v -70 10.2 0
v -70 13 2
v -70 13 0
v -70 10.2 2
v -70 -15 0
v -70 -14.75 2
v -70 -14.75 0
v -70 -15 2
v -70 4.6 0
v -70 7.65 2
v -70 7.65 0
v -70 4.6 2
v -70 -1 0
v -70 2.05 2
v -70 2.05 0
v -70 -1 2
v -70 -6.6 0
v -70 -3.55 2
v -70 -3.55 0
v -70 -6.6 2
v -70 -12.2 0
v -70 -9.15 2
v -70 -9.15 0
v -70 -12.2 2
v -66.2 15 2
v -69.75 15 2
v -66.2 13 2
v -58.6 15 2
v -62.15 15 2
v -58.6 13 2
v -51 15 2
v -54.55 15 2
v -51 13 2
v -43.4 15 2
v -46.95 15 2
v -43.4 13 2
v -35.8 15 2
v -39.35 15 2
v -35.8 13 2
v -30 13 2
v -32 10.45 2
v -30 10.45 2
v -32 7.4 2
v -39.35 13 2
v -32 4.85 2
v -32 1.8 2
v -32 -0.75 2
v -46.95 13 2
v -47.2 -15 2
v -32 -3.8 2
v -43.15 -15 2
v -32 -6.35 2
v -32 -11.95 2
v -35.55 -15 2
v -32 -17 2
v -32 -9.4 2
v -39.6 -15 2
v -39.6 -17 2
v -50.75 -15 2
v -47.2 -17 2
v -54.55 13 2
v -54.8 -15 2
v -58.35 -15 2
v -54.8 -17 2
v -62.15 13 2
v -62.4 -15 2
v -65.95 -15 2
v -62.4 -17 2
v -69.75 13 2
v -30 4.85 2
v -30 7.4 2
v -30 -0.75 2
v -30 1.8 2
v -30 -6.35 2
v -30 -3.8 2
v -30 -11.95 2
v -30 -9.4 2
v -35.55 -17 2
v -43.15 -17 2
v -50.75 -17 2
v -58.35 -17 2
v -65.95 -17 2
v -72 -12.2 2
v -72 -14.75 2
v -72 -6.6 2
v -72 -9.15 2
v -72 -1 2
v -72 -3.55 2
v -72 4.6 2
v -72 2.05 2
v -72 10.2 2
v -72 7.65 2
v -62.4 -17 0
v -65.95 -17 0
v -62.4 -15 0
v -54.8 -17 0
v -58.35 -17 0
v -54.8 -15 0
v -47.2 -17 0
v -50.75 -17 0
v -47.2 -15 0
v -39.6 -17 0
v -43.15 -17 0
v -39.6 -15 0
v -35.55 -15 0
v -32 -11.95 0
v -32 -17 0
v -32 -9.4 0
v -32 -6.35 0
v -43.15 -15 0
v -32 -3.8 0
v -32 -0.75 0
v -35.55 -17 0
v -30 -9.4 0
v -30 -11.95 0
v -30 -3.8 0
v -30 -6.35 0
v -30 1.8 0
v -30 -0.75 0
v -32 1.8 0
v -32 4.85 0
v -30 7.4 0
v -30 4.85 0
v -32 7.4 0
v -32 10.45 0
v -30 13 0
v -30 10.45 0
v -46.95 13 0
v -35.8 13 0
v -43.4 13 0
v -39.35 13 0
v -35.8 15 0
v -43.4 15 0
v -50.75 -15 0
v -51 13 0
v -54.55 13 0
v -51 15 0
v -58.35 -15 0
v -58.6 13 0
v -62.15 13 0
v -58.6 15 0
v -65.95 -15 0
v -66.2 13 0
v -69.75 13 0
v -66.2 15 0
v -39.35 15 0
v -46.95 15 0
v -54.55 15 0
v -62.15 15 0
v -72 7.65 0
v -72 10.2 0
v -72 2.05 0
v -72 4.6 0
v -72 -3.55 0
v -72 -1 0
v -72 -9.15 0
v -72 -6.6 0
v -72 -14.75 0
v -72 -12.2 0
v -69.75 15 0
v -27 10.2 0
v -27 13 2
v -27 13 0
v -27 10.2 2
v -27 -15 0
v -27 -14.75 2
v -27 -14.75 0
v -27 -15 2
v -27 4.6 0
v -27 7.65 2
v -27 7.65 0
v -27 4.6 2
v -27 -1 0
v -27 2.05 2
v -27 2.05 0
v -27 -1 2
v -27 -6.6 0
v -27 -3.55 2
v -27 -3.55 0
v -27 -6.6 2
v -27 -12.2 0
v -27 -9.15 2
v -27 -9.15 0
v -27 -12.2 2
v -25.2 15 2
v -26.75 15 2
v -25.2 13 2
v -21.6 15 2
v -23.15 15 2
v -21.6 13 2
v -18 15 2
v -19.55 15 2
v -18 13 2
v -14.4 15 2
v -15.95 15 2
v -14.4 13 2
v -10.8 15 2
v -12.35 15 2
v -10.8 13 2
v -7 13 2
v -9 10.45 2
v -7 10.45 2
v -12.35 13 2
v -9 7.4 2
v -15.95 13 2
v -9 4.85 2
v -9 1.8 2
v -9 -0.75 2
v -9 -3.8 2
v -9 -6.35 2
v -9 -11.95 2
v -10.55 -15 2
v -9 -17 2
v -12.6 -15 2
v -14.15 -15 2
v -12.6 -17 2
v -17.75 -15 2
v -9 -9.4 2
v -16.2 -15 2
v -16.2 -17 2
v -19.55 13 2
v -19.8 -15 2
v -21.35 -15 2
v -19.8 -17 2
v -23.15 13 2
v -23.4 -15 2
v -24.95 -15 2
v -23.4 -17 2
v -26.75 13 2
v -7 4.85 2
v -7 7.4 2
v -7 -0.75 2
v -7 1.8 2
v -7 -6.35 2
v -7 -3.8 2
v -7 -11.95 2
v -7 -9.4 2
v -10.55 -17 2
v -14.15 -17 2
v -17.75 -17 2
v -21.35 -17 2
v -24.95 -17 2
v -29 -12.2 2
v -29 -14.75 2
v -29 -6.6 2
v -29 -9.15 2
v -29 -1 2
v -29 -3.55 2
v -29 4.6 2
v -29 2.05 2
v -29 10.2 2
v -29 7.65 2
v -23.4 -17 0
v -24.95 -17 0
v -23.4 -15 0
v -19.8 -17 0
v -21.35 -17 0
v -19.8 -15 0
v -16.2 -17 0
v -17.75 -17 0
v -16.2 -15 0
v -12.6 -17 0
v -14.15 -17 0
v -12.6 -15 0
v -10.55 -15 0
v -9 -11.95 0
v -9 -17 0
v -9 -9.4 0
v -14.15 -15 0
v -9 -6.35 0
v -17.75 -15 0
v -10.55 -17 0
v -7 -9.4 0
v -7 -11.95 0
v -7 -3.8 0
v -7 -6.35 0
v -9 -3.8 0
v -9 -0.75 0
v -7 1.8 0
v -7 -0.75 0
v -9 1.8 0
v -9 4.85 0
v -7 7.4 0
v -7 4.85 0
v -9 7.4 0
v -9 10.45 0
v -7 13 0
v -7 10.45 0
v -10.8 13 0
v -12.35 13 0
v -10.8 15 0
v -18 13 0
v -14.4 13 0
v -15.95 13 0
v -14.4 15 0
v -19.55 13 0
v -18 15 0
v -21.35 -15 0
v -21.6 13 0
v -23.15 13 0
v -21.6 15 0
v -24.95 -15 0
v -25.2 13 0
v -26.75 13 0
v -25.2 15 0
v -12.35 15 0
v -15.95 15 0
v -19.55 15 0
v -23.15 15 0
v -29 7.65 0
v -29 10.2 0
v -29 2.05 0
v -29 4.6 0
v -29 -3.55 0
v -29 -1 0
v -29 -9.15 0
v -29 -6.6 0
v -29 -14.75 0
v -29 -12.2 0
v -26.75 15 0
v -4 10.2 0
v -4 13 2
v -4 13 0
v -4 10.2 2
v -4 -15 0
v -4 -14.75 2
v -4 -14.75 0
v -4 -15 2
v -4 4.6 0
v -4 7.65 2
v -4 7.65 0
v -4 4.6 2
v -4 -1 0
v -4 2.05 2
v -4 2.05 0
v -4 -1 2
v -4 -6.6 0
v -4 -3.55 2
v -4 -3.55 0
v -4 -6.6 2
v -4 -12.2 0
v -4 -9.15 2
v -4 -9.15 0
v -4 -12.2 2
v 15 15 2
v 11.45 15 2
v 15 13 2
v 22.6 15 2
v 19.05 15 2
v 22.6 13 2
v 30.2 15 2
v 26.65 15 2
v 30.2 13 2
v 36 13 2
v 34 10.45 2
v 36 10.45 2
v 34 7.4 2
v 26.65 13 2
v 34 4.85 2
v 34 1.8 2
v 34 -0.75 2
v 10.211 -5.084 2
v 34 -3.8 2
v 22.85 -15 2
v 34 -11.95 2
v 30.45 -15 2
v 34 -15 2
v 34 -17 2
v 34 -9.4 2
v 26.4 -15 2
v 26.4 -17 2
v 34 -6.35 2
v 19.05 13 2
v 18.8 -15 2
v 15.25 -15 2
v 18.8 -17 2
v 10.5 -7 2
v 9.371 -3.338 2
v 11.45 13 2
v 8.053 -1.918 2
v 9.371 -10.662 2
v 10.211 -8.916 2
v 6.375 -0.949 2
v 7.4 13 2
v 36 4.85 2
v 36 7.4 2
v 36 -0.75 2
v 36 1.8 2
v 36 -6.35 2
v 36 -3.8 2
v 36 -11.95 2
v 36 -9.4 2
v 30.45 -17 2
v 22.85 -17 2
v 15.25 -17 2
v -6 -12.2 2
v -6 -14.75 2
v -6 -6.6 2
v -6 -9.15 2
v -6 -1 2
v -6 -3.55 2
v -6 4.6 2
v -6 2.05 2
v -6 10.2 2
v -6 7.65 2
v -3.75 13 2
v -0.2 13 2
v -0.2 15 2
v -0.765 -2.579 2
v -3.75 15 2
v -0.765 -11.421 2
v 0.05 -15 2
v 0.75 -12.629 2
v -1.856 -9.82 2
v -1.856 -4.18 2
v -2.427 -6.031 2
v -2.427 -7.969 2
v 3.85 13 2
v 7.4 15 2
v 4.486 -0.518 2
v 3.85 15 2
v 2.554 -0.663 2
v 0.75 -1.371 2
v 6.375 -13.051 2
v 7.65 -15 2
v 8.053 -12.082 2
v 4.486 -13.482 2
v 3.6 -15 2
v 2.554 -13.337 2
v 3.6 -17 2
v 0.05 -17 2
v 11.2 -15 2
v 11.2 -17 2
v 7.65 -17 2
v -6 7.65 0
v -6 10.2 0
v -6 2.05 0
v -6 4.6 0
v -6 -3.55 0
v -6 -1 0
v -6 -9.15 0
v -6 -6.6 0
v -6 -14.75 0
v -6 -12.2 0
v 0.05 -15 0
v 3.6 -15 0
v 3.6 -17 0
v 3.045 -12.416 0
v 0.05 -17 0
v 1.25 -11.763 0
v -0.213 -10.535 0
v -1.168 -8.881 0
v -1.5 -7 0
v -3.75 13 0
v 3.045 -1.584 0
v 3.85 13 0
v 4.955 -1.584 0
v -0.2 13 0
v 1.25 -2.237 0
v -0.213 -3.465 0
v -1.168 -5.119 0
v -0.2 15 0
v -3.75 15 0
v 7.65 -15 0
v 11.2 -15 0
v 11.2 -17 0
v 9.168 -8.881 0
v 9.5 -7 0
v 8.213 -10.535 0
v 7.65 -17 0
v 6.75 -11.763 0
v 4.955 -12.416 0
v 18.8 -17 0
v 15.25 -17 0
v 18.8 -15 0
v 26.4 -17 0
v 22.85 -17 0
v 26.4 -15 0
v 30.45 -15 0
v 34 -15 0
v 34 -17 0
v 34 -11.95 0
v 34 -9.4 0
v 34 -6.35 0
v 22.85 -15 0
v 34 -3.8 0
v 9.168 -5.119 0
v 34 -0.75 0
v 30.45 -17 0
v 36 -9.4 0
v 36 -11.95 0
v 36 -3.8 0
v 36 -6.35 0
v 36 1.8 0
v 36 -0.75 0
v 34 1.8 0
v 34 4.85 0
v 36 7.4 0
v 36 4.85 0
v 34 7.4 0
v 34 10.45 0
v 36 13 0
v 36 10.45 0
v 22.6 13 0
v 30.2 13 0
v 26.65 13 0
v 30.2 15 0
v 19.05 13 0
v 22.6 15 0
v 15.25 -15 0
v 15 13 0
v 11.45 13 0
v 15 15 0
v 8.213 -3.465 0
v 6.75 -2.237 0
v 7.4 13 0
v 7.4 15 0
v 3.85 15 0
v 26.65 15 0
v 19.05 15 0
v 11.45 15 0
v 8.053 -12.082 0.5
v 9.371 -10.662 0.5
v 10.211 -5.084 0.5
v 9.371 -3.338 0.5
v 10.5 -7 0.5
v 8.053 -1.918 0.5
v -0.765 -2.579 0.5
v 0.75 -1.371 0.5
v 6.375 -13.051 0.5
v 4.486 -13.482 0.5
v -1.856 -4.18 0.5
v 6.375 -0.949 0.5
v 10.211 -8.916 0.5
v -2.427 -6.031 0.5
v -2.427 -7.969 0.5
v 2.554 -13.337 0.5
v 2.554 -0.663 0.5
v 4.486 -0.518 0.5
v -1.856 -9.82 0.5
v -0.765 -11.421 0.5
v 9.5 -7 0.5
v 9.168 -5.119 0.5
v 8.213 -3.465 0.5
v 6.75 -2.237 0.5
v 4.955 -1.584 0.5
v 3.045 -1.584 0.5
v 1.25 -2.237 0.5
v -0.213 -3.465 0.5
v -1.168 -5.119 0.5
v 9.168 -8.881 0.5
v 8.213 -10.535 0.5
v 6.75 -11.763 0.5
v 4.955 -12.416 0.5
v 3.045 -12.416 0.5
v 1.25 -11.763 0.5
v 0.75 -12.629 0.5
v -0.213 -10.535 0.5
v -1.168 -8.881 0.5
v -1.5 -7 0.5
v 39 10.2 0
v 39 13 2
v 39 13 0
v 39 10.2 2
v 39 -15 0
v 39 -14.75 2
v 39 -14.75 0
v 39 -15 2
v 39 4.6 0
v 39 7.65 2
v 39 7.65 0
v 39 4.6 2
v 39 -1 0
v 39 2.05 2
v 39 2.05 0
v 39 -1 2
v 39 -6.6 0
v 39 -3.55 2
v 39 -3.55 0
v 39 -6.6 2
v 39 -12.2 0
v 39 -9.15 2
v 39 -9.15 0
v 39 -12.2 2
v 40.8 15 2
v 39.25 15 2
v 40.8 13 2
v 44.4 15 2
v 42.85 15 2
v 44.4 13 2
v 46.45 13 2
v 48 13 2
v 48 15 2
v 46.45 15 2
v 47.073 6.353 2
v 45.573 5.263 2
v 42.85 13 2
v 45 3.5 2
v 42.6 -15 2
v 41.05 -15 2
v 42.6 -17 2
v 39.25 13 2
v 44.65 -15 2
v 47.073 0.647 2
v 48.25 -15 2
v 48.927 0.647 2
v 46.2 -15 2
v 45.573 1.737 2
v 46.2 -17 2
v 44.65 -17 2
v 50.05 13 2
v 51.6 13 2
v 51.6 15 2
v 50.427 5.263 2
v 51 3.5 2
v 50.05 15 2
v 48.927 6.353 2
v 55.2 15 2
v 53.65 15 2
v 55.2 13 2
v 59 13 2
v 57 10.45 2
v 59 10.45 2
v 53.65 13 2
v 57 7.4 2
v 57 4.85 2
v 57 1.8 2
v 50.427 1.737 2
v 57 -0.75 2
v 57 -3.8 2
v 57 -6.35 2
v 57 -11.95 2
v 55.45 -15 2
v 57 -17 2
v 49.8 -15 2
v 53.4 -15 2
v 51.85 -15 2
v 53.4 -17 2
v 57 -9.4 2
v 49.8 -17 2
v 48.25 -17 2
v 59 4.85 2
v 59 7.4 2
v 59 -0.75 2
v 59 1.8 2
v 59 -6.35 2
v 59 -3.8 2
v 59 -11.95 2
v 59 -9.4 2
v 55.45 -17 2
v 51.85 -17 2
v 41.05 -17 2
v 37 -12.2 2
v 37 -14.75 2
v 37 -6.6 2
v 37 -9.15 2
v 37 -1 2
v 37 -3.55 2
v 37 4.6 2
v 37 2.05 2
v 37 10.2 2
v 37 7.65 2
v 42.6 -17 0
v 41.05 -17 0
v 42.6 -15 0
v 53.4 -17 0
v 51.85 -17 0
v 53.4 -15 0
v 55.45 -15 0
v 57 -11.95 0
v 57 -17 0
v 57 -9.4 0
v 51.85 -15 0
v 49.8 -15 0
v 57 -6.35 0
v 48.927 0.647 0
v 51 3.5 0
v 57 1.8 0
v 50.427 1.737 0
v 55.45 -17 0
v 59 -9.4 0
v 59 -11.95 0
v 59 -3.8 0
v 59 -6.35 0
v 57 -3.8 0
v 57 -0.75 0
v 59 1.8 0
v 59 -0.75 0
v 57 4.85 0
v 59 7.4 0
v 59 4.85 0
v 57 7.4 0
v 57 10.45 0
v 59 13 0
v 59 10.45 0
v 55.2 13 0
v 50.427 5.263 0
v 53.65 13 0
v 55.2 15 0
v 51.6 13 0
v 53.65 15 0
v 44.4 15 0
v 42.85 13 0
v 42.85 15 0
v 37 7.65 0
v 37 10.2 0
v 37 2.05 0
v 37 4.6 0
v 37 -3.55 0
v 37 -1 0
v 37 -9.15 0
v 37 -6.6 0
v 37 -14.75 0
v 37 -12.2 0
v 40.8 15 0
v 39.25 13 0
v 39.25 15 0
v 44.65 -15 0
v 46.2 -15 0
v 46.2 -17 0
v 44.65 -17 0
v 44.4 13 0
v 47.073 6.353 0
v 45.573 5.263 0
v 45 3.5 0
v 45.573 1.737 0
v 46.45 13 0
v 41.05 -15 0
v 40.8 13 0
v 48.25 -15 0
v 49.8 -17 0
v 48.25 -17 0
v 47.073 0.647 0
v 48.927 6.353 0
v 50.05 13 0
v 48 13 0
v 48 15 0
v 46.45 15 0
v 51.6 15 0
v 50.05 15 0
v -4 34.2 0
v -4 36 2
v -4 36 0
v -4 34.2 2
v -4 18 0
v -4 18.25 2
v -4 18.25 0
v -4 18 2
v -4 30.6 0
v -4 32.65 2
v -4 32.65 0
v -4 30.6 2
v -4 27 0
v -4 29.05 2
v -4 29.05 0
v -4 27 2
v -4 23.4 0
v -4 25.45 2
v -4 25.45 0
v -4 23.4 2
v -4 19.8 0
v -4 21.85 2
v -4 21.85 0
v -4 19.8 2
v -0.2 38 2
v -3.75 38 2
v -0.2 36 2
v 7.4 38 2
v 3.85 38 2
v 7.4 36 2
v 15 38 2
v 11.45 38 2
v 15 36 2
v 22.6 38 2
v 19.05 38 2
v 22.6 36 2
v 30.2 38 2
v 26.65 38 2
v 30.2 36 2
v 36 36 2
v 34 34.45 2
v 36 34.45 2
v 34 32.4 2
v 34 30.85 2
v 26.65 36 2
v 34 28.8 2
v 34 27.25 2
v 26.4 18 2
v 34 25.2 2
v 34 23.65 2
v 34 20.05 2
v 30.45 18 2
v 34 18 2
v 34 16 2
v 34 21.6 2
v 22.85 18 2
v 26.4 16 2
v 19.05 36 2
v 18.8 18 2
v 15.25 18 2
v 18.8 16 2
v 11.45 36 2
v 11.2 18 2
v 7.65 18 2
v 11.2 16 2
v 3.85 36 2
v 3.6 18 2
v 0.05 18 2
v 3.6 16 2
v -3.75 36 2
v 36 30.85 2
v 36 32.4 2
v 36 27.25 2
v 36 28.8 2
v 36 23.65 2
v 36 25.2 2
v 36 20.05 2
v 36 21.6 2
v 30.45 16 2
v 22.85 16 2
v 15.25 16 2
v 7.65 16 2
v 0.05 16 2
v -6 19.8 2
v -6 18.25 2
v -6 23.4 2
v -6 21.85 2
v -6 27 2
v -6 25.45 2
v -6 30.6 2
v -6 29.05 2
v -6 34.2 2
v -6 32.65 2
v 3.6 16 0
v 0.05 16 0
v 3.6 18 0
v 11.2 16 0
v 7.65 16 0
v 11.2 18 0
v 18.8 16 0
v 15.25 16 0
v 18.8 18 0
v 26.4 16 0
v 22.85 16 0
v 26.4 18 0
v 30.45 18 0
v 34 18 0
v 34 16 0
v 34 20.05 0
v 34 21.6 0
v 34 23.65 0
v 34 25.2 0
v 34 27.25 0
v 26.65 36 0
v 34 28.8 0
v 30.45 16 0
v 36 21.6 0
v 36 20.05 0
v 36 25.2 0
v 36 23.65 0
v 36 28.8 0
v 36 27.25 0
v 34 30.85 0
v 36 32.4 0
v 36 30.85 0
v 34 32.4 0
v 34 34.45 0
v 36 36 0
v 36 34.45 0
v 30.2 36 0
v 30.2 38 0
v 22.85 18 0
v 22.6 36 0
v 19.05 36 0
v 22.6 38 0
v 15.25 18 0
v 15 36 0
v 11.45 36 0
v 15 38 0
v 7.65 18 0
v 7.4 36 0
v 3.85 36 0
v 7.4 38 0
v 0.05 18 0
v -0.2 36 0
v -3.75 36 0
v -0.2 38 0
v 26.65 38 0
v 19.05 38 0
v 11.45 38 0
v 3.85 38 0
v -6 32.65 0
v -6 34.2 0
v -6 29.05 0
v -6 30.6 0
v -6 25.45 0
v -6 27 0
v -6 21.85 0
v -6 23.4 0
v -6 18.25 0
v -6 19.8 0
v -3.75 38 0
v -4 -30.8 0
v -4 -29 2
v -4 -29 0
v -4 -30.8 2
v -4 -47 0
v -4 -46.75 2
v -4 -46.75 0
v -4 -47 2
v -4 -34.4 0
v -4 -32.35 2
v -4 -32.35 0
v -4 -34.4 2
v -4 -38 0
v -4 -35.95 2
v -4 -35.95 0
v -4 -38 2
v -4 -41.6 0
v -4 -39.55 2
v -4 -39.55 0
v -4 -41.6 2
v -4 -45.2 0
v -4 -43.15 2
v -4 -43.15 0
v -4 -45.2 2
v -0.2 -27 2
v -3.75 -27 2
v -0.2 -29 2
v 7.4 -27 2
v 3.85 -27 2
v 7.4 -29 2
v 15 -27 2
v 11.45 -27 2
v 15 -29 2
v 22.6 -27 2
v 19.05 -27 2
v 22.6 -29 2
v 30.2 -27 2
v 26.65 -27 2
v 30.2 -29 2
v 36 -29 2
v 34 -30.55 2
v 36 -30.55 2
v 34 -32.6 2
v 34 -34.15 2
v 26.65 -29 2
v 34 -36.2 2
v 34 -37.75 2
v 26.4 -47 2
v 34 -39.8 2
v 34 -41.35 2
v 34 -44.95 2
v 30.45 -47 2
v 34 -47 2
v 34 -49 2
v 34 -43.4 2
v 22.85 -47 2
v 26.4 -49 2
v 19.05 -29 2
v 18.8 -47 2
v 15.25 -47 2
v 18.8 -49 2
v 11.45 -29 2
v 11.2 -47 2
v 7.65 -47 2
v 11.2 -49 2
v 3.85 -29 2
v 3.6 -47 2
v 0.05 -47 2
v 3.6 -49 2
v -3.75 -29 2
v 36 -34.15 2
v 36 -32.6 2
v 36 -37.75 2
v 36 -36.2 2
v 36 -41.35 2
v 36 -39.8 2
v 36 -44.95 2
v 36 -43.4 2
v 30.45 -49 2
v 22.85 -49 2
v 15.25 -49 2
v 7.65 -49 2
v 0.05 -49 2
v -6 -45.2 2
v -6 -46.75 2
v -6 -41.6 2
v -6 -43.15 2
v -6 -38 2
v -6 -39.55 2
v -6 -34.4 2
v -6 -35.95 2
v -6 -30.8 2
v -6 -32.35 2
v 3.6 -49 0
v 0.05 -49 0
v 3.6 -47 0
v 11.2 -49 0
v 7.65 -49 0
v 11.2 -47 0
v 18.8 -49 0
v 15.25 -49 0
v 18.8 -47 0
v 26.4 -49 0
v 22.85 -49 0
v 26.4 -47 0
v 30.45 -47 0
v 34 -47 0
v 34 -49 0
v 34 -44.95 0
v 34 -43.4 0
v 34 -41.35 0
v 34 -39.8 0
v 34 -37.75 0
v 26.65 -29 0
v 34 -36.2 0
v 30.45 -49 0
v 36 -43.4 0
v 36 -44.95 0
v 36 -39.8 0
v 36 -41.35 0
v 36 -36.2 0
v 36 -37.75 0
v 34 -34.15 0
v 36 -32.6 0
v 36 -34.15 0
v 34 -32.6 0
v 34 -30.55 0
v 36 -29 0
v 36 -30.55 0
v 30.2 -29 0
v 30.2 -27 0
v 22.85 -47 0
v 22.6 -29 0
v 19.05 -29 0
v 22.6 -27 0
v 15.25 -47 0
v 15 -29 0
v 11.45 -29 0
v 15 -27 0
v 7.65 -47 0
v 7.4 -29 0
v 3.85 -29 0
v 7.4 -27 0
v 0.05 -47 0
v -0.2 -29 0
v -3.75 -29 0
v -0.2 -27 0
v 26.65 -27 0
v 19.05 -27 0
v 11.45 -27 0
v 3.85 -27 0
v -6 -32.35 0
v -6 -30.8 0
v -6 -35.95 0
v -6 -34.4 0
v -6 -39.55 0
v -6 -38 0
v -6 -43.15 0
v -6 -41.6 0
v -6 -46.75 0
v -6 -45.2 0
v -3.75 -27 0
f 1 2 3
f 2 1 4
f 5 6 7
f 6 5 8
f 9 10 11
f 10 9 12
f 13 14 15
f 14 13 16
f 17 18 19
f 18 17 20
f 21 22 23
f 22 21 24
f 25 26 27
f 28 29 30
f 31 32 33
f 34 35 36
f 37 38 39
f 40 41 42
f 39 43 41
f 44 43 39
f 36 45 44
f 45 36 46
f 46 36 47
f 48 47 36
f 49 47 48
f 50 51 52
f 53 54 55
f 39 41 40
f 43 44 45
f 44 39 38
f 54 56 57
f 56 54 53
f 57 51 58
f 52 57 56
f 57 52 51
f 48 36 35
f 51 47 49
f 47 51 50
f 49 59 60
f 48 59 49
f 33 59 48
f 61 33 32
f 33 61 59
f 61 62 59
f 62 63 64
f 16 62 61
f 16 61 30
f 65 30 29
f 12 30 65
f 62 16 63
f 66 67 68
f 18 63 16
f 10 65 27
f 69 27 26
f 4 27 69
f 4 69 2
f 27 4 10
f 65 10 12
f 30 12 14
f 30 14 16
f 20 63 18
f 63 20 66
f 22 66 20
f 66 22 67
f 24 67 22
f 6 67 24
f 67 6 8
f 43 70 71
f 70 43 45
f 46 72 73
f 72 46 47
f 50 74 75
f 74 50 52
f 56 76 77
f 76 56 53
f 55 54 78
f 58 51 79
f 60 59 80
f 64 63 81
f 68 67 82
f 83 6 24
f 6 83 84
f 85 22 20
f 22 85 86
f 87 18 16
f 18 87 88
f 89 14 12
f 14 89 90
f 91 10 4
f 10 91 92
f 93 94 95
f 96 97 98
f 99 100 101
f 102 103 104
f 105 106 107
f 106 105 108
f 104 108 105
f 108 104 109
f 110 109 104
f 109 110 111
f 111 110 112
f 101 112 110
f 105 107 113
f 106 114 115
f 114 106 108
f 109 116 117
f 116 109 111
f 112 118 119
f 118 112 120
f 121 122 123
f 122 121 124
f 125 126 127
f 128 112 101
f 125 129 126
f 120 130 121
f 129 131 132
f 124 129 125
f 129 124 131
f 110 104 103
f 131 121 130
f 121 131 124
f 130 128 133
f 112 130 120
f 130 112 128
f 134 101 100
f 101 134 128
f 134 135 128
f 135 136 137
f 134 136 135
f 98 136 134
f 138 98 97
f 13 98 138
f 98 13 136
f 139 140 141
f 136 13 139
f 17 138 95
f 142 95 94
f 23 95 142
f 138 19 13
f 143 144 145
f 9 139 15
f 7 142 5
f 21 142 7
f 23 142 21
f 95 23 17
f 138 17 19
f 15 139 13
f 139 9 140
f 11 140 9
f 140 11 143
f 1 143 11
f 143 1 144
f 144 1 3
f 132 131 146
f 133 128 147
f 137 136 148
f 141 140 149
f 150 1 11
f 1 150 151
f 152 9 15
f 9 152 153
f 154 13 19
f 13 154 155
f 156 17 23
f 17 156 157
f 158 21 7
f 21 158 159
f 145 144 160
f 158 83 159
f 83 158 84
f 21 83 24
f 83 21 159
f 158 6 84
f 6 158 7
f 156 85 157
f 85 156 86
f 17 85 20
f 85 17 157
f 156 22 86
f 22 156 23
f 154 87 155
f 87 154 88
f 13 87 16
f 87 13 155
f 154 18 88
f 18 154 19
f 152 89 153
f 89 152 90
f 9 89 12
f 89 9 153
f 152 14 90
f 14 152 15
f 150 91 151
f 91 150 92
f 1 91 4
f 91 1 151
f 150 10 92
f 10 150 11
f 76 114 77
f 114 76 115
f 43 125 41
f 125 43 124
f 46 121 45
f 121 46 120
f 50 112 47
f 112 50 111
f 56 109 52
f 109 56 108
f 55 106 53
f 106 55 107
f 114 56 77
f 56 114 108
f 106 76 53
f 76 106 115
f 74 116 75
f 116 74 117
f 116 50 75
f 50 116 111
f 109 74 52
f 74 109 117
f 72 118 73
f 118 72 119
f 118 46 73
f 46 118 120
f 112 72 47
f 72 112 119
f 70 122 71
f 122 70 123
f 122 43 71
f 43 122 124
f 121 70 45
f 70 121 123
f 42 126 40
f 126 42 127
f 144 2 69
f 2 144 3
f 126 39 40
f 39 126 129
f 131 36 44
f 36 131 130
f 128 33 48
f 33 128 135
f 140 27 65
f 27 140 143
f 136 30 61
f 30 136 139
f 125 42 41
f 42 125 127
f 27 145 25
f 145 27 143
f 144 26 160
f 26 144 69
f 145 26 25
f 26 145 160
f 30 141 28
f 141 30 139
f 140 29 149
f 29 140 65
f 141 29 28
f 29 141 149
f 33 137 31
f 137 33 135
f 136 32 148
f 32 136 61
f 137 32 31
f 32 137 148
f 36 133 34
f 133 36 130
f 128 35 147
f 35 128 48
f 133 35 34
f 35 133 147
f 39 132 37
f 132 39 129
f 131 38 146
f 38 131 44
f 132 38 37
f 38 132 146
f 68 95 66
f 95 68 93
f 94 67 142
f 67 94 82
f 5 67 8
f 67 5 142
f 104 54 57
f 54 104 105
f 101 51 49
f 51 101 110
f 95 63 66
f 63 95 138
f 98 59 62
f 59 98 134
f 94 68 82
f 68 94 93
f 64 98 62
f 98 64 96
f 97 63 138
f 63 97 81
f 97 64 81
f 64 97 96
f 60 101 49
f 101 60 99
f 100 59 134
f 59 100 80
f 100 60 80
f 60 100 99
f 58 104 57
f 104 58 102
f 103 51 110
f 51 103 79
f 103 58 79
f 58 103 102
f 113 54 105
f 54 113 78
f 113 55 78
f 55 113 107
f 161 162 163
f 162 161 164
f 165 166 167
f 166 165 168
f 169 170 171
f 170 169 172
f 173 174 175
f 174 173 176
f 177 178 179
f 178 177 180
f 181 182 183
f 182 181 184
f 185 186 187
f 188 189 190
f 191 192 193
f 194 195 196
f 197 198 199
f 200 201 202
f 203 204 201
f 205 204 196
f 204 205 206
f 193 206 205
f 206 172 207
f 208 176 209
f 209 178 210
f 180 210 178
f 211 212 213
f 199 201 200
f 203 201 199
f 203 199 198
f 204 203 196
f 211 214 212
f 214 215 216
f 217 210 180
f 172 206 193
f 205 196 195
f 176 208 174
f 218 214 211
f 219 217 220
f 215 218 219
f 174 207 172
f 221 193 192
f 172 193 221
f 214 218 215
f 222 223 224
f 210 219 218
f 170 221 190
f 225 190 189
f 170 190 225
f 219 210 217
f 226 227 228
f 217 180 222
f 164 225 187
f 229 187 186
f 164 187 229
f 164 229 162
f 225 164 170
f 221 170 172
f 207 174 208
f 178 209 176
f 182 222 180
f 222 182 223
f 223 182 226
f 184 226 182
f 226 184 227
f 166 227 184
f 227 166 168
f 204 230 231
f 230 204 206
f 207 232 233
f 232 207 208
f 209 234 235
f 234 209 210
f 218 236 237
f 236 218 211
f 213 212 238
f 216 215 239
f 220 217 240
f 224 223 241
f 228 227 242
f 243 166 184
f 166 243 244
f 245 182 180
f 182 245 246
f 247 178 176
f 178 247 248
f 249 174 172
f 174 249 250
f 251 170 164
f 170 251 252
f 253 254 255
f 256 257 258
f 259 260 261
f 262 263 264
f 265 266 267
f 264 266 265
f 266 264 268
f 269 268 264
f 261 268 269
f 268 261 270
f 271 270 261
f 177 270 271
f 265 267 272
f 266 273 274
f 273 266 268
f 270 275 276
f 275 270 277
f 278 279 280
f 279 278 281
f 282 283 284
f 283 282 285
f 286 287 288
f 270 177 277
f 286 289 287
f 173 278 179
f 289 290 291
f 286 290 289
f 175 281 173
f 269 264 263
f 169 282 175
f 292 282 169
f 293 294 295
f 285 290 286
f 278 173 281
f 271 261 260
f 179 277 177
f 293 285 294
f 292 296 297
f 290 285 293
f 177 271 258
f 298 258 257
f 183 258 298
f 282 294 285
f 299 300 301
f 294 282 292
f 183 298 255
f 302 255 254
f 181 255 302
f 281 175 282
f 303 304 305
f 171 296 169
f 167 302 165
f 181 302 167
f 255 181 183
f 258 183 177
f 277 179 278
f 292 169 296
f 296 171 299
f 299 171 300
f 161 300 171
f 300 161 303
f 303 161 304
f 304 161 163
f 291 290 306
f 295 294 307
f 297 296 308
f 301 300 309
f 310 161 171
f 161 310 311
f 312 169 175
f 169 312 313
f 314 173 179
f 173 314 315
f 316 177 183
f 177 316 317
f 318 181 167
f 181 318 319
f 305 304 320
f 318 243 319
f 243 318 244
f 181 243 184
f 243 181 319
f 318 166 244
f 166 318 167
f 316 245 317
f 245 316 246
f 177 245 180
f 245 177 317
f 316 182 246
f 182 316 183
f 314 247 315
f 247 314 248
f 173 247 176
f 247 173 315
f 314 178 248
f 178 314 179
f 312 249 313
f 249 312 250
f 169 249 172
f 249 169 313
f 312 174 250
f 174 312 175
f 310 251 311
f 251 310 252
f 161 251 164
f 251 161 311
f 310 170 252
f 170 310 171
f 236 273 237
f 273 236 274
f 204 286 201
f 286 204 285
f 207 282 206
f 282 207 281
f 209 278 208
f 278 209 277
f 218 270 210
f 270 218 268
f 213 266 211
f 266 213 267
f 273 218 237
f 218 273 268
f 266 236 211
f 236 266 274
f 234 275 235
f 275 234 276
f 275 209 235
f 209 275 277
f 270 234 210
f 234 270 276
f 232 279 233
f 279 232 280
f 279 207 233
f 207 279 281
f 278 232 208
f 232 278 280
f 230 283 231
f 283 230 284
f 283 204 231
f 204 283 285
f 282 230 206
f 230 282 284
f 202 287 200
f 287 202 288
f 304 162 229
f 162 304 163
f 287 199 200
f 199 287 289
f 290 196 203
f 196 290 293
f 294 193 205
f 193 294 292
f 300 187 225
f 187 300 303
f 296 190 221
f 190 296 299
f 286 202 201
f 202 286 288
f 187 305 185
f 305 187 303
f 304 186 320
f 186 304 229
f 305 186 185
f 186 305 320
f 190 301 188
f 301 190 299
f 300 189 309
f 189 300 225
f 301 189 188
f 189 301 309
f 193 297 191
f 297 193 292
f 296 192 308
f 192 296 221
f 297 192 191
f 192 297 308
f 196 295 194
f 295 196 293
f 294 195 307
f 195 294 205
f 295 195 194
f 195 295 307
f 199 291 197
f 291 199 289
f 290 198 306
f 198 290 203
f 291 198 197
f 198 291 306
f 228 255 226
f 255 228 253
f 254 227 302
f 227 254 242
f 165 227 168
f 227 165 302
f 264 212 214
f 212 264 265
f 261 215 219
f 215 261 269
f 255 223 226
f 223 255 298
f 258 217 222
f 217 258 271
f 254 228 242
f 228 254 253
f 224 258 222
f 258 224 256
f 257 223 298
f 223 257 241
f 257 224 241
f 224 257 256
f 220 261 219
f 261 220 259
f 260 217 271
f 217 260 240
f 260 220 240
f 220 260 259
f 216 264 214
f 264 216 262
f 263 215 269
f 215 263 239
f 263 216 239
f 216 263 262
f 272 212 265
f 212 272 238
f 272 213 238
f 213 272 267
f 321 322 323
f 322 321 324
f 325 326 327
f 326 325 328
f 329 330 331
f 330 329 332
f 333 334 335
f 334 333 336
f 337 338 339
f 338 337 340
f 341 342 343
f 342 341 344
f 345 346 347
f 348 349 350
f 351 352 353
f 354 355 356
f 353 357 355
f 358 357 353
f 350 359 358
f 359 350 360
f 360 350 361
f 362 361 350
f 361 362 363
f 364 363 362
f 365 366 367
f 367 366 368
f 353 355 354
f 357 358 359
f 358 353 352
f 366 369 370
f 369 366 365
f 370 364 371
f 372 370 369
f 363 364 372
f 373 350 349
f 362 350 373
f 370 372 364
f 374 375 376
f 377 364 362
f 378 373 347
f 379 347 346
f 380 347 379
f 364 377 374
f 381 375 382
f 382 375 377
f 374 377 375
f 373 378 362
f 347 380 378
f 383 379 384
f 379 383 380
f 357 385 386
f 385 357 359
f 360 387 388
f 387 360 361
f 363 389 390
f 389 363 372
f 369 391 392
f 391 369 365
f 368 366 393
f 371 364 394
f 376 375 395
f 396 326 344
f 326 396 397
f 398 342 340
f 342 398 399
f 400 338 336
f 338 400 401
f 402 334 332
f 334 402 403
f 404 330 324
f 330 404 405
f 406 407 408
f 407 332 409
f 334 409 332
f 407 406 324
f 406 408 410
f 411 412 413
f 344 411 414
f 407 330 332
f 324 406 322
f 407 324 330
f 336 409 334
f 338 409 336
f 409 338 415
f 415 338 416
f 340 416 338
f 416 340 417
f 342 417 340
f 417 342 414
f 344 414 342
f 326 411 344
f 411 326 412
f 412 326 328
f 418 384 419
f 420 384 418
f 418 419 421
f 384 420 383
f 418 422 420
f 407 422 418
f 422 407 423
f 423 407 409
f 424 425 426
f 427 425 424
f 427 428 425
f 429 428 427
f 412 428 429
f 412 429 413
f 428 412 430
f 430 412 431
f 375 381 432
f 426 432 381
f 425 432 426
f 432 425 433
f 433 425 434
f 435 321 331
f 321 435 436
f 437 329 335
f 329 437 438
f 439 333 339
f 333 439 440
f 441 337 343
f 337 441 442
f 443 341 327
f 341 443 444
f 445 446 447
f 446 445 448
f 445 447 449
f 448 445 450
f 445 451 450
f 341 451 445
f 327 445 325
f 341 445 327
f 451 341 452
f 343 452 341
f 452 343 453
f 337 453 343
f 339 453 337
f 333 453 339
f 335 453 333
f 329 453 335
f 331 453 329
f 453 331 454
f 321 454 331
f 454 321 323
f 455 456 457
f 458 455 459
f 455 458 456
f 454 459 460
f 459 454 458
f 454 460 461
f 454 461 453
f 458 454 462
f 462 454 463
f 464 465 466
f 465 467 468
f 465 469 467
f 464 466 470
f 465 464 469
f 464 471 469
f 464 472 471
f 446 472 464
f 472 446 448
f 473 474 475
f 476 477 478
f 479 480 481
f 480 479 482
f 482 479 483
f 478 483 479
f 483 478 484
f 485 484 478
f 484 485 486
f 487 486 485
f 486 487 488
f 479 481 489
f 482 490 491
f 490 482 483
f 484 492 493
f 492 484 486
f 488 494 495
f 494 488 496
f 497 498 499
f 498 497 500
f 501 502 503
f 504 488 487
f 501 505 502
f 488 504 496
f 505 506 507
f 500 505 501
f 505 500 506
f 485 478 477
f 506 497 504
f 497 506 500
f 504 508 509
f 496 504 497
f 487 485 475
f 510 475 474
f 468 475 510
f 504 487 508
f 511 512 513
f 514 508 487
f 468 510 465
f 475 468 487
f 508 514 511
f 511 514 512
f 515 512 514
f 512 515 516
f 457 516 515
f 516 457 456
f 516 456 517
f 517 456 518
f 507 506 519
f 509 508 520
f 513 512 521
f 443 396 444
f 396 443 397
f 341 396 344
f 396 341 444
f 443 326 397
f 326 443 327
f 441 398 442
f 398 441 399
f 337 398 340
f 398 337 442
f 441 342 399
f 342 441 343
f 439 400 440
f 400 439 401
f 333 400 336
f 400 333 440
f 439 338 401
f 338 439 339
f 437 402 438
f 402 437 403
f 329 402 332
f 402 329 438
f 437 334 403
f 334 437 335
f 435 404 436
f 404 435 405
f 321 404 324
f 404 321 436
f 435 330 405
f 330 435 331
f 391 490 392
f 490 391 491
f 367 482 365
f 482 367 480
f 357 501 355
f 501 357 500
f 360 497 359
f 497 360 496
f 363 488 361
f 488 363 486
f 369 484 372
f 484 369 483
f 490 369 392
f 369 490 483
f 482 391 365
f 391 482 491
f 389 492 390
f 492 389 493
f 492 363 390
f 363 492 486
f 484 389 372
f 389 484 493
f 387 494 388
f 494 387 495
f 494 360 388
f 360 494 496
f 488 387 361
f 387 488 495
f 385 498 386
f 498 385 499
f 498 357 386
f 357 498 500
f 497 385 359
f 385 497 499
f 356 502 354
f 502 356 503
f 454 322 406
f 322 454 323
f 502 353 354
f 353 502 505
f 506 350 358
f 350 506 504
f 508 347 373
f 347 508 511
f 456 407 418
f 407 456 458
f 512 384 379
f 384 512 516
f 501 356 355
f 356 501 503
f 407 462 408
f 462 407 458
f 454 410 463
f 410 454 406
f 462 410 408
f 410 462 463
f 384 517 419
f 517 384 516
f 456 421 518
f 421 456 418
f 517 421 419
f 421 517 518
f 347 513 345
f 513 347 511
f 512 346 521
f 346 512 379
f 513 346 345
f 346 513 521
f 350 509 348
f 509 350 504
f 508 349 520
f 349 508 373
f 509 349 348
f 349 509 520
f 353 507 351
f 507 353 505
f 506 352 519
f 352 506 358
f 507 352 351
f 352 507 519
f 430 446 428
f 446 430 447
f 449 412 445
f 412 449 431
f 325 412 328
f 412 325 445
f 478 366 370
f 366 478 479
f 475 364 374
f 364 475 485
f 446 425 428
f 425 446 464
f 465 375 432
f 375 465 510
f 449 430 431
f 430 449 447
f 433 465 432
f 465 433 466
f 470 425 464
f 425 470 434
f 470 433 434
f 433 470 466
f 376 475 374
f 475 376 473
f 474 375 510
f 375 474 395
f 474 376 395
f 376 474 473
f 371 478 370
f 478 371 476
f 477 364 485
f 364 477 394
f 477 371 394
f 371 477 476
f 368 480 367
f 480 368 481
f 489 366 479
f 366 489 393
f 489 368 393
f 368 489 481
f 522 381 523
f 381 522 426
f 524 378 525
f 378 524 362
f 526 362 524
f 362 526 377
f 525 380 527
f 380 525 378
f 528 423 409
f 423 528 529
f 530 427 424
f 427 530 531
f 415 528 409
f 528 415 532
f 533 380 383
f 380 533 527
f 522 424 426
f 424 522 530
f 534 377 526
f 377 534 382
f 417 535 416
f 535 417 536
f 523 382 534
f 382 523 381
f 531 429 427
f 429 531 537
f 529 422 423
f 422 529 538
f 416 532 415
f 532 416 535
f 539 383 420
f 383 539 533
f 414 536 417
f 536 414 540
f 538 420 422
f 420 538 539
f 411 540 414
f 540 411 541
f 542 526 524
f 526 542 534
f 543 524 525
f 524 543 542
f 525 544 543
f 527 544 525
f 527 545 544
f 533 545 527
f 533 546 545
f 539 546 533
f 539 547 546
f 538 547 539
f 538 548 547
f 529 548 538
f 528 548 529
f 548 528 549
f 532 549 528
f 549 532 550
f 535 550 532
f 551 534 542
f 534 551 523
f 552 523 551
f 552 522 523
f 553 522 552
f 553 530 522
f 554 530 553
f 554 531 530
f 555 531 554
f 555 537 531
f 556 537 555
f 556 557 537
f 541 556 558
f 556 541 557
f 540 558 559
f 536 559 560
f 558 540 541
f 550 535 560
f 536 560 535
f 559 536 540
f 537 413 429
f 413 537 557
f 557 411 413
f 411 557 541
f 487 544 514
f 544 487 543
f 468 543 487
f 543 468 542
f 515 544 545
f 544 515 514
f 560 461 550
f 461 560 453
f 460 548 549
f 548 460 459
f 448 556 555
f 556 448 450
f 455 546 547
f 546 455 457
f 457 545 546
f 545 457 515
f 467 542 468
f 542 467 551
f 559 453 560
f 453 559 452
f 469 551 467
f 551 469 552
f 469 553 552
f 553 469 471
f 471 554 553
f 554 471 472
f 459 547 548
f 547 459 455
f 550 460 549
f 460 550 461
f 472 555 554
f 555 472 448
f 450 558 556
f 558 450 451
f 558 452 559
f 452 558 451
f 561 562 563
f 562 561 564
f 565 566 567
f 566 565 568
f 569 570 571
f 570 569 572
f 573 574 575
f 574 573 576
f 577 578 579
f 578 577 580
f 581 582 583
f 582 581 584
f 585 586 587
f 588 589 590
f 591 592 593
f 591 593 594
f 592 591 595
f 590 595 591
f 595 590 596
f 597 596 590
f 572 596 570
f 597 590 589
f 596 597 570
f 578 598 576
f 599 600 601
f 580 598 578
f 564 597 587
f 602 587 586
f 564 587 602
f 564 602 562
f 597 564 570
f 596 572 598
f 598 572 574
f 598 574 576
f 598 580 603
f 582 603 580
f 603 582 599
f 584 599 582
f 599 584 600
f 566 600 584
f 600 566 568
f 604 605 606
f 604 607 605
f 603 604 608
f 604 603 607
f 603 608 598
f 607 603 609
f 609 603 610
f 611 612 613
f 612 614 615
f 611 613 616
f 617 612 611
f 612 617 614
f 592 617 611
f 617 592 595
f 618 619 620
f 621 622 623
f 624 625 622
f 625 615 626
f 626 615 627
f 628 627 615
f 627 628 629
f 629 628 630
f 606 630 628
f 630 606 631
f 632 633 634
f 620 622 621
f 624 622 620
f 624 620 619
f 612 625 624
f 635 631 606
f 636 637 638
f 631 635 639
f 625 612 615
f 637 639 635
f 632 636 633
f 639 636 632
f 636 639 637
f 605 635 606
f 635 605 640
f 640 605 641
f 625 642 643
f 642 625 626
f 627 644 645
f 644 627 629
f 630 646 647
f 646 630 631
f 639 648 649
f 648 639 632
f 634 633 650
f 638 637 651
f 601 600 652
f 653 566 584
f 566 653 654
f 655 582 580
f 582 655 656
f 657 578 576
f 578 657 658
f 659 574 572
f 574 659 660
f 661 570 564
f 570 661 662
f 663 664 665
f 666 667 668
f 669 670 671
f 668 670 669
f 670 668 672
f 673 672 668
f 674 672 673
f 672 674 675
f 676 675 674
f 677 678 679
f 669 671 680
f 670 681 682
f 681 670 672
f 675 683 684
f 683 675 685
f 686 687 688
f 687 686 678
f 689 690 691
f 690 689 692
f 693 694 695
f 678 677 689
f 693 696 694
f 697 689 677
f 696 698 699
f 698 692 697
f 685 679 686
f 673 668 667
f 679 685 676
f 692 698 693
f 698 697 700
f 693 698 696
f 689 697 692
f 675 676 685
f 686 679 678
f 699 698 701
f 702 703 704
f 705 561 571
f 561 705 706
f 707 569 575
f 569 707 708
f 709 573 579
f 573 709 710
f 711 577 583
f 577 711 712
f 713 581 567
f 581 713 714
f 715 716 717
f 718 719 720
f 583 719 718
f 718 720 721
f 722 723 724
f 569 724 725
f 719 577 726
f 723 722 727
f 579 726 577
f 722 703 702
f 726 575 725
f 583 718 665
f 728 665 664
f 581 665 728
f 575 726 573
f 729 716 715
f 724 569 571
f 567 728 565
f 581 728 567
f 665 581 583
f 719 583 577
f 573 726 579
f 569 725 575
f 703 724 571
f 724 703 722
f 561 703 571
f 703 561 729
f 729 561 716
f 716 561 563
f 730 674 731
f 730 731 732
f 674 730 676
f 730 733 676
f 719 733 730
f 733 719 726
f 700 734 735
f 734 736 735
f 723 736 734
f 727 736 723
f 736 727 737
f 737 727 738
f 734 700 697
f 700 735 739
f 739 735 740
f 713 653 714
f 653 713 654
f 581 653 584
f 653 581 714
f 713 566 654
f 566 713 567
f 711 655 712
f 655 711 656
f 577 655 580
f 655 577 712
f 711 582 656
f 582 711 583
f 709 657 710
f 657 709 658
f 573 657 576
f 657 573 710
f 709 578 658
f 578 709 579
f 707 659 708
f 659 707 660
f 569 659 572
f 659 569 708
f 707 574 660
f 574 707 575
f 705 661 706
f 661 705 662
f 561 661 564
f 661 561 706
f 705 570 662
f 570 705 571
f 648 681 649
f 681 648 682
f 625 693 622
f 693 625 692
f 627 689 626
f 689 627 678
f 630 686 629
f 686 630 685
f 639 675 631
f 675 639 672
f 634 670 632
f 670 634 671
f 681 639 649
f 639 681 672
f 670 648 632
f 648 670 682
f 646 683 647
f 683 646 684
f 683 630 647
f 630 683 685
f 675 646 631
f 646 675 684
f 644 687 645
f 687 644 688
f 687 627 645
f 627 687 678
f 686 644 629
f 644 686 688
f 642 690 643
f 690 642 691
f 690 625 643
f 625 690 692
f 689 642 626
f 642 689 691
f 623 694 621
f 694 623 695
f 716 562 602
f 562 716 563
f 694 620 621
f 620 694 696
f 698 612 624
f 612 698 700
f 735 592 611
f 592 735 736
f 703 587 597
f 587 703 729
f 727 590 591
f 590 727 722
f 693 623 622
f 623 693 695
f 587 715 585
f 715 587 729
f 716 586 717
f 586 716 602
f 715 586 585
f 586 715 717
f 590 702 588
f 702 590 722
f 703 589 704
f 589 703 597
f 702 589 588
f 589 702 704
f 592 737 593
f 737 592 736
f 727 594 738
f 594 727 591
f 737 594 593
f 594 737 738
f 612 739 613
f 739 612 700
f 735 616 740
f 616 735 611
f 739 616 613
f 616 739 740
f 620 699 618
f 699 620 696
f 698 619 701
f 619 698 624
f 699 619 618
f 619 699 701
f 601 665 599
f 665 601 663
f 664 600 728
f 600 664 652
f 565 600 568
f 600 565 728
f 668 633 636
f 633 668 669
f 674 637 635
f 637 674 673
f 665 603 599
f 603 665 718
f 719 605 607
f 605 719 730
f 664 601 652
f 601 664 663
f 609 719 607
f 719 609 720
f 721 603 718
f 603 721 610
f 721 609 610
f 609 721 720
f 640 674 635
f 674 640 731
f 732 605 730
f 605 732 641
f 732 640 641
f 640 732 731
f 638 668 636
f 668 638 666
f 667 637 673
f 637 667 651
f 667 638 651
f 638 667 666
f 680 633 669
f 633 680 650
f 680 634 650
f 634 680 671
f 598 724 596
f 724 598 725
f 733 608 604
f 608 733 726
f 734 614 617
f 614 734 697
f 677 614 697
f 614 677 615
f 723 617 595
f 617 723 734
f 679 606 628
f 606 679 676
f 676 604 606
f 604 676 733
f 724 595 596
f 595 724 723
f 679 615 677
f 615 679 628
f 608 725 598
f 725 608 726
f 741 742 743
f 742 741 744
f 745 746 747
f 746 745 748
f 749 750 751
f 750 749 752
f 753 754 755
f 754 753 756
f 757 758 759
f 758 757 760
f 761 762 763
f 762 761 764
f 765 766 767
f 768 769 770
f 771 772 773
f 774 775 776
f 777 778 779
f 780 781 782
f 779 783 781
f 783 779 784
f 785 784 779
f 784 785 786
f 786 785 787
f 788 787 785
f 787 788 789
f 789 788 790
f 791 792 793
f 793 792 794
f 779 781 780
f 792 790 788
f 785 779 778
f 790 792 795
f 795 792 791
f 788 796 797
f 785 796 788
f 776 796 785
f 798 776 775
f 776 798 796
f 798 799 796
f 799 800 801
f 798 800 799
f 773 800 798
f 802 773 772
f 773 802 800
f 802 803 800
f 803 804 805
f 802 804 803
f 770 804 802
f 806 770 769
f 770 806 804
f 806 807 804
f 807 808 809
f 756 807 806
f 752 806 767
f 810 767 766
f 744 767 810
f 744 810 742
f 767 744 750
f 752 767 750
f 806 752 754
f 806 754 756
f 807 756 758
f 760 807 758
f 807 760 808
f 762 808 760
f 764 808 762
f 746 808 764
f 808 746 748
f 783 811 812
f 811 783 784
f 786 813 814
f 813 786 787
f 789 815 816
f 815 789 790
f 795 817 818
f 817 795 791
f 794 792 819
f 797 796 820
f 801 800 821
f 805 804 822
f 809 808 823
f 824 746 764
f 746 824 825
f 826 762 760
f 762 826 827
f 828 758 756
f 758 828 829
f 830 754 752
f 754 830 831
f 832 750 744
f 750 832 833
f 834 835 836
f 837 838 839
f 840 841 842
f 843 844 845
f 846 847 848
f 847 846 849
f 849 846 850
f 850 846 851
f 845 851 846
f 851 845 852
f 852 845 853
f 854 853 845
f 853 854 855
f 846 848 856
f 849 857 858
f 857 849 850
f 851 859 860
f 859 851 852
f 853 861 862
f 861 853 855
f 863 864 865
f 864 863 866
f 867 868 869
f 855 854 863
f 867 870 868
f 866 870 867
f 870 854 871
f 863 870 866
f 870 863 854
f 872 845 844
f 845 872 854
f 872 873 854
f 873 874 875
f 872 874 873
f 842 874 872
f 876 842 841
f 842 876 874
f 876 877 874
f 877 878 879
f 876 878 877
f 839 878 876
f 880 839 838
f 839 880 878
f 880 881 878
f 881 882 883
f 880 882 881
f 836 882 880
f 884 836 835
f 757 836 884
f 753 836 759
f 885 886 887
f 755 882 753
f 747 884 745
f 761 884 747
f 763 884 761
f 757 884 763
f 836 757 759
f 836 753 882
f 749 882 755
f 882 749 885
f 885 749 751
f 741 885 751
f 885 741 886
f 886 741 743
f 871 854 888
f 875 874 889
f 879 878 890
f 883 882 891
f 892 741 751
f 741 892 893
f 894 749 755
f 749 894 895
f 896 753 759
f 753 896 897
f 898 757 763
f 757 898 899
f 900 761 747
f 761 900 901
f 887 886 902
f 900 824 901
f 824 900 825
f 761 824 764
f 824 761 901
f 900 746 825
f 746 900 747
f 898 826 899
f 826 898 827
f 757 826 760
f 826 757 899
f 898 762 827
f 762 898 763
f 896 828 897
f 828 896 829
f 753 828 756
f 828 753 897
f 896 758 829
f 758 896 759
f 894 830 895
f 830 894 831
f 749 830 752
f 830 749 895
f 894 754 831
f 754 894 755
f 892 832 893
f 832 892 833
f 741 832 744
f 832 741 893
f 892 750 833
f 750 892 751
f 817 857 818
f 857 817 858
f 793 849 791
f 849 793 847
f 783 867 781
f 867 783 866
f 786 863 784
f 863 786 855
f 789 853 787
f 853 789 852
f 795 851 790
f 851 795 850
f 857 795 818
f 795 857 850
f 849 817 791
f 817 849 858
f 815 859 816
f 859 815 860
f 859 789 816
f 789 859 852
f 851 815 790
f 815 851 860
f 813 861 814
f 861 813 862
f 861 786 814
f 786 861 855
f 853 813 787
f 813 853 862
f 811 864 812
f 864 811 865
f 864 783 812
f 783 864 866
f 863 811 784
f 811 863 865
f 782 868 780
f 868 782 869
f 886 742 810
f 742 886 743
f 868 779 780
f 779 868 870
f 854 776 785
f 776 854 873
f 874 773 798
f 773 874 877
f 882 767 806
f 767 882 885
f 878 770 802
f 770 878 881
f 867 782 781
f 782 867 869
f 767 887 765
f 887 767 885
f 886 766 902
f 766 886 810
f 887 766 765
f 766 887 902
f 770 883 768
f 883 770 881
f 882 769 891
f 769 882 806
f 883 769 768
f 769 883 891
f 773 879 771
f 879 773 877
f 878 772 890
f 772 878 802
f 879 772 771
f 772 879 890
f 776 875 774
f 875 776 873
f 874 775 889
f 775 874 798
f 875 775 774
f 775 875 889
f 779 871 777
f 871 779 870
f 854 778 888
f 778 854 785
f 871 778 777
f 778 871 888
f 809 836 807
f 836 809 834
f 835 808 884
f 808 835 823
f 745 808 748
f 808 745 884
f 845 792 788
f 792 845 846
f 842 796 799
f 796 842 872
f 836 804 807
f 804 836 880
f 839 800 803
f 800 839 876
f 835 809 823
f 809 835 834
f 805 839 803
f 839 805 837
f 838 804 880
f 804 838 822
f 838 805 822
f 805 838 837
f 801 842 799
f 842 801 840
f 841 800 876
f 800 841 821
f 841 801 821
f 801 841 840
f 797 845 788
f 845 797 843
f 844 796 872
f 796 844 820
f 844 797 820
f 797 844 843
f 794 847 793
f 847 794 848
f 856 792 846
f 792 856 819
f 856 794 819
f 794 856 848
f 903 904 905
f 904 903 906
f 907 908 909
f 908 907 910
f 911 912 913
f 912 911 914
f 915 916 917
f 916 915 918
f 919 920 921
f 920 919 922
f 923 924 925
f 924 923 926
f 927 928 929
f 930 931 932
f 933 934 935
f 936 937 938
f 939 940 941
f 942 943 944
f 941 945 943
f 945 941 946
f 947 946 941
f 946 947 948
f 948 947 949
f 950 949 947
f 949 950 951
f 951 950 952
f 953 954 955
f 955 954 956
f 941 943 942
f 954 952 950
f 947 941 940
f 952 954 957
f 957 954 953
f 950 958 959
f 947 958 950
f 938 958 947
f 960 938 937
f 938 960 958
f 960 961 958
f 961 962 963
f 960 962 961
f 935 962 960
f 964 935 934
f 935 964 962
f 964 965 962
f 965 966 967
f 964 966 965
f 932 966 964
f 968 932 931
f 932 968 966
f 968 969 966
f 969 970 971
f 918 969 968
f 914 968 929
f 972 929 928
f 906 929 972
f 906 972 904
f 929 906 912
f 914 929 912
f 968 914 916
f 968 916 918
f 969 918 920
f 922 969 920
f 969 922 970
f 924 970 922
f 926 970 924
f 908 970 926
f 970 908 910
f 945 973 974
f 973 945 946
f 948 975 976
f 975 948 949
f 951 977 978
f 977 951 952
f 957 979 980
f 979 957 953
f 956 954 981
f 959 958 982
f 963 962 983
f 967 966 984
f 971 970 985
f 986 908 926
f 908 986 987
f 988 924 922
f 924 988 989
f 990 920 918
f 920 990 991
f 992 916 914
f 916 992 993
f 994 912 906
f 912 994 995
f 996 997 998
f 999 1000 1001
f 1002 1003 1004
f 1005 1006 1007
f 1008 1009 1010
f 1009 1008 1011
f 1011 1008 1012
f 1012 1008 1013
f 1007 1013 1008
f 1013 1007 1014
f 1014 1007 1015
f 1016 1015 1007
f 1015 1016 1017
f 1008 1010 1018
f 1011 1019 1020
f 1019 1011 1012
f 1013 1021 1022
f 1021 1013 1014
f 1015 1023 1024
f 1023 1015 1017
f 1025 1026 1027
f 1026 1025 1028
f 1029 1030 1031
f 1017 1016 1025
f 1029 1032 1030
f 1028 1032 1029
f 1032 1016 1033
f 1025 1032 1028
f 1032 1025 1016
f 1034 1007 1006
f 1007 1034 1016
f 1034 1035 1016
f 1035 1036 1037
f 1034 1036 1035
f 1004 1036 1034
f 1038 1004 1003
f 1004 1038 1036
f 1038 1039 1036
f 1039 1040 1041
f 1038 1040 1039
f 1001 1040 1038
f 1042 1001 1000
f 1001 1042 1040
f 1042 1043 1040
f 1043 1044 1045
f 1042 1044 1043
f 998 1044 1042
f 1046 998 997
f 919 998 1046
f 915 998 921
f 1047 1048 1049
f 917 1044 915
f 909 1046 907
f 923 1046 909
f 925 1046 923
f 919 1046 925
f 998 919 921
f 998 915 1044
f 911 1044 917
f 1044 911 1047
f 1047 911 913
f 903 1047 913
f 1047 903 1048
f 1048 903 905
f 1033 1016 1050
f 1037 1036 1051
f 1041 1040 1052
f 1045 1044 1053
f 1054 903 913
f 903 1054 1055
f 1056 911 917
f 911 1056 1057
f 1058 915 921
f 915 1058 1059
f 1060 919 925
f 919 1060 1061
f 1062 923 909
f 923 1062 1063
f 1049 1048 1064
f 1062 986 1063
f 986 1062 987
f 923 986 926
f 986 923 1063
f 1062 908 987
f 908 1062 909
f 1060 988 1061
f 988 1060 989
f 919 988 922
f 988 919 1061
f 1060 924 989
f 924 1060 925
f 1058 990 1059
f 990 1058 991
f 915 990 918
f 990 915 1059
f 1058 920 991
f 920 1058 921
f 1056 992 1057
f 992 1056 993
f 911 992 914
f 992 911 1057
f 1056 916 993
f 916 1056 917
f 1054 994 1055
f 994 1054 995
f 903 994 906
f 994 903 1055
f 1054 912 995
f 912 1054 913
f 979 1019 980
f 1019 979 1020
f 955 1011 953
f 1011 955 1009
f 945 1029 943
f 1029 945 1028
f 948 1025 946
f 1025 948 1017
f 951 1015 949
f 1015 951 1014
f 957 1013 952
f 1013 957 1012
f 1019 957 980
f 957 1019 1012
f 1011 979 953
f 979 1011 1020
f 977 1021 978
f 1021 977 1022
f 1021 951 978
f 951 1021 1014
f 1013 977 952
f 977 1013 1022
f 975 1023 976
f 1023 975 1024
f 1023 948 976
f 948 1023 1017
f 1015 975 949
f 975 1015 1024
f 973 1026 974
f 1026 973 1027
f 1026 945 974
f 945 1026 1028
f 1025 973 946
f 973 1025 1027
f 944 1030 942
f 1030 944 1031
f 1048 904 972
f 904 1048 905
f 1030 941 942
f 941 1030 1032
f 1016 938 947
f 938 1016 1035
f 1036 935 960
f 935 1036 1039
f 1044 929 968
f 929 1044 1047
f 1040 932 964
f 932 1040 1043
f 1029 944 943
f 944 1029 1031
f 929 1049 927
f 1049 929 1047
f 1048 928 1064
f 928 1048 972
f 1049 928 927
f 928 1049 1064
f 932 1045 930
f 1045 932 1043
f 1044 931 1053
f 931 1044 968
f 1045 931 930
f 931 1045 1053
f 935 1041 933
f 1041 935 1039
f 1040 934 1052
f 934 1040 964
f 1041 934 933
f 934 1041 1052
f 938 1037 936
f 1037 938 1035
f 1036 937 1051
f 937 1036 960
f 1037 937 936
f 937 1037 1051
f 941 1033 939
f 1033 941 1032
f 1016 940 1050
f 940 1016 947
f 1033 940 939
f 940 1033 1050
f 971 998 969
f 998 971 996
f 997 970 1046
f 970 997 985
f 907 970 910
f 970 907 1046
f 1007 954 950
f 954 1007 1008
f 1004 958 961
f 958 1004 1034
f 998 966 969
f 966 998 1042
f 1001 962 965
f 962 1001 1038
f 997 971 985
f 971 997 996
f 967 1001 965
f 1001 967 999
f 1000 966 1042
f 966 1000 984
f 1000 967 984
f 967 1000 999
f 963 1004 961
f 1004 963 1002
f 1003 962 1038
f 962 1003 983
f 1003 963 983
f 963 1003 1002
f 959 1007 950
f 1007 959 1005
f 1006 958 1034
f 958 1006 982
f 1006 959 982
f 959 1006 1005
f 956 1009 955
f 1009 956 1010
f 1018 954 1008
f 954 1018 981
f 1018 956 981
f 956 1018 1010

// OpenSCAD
outer_width = 40; // mm
outer_depth = 30; // mm
outer_height = 20; // mm
wall_thickness = 2; // mm
inner_width = outer_width - wall_thickness; // mm
inner_depth = outer_depth - wall_thickness; // mm
inner_height = outer_height - wall_thickness; // mm
n_teeth = 10;
x_teeth_length = inner_width / n_teeth;
y_teeth_length = inner_depth / n_teeth;
z_teeth_length = inner_height/ n_teeth;
piezo_diameter = 12; // mm
piezo_radius = piezo_diameter  / 2; // mm
cable_diameter = 5; // mm
cable_radius = cable_diameter / 2; // mm

// The teeth need some air between them.
// This is the amount of space that each tooth get shorten
// with at each side
teeth_air = 0.25; // mm

spacing = 1; // Spacing between the parts, mm

part_1_x = -outer_width - outer_depth;
part_1_y = -outer_depth / 2;

part_2_x = part_1_x + outer_width + wall_thickness + spacing;
part_2_y = part_1_y;

part_3_x = part_2_x + outer_height + wall_thickness + spacing;
part_3_y = part_2_y;

part_4_x = part_3_x + outer_width + wall_thickness + spacing;
part_4_y = part_3_y;

part_5_x = part_3_x;
part_5_y = part_3_y + outer_depth + wall_thickness + spacing;

part_6_x = part_3_x;
part_6_y = part_3_y - (outer_depth / 2) - (outer_height / 2) - (3 * wall_thickness) - spacing;

//
//        +--+  +--+  +--+
//        |  |  |  |  |  |
//        +..+--+..+--+..+--+--+
//        |                 .  |
//     +--+                 +--+
//     |  .                 |   
//     +--+                 +--+
//        |                 .  |
//     +--+                 +--+
//     |  .                 |
//     +--+--+..+--+..+--+..+
//           |  |  |  |  |  |
//           +--+  +--+  +--+
//
module draw_piece(
  part_x,
  part_y,
  inner_dx,
  inner_dy,
  n_teeth
) {
  translate([part_x, part_y, 0])
    cube([inner_dx, inner_dy, wall_thickness]);

  x_teeth_length = inner_dx / n_teeth;
  y_teeth_length = inner_dy / n_teeth;

  // Left teeth
  for (i = [0:n_teeth/2-1])
    translate([part_x, part_y, 0])
      translate([-wall_thickness, i * y_teeth_length  * 2,0])
        translate([0, teeth_air, 0])
          cube([wall_thickness,y_teeth_length - teeth_air,wall_thickness]);
  // Right teeth
  for (i = [0:n_teeth/2-1])
    translate([part_x, part_y, 0])
      translate([inner_dx, y_teeth_length + (i * y_teeth_length  * 2),0])
        translate([0, teeth_air, 0])
          cube([wall_thickness,y_teeth_length - teeth_air,wall_thickness]);
  // Top, between 5 and 1
  for (i = [0:n_teeth/2-1])
    translate([part_x, part_y, 0])
      translate([0 + (i * x_teeth_length  * 2), inner_dy, 0])
        translate([teeth_air, 0, 0])
          cube([x_teeth_length - teeth_air, wall_thickness,wall_thickness]);
  // Bottom teeth, between 1 and 6 
  for (i = [0:n_teeth/2-1])
    translate([part_x, part_y, 0])
      translate([x_teeth_length + (i * x_teeth_length  * 2), -wall_thickness,0])
        translate([teeth_air, 0, 0])
          cube([x_teeth_length - teeth_air, wall_thickness, wall_thickness]);

}


//     +-+
//     |5|
// +-+-+-+-+
// |1|2|3|4|
// +-+-+-+-+
//     |6|
//     +-+

draw_piece(
  part_1_x, // part_x 
  part_1_y,  // part_y
  inner_width, // inner_dx
  inner_depth, // inner_dy
  n_teeth // n_teeth
);

draw_piece(
  part_2_x, // part_x 
  part_2_y,  // part_y
  inner_height, // inner_dx
  inner_depth, // inner_dy
  n_teeth // n_teeth
);


difference() {
  union() {
    draw_piece(
      part_3_x, // part_x 
      part_3_y,  // part_y
      inner_width, // inner_dx
      inner_depth, // inner_dy
      n_teeth // n_teeth
    );
  }

  translate([part_3_x + piezo_radius + wall_thickness, part_3_y + piezo_radius + wall_thickness, 0.5])
    cylinder(10, (piezo_diameter / 2) + (teeth_air * 2), (piezo_diameter / 2) + (teeth_air * 2));
  translate([part_3_x + piezo_radius + wall_thickness, part_3_y + piezo_radius + wall_thickness, -5])
    cylinder(10, piezo_radius - (teeth_air * 2), piezo_radius - (teeth_air * 2));
}

difference() {
  union() {
    draw_piece(
      part_4_x, // part_x 
      part_4_y,  // part_y
      inner_height, // inner_dx
      inner_depth, // inner_dy
      n_teeth // n_teeth
    );
  }
  translate([part_4_x + cable_radius + (inner_height / 4) + wall_thickness, part_4_y + cable_radius + (inner_depth / 2) + wall_thickness, -5])
    cylinder(10, cable_radius + (teeth_air * 2), cable_radius + (teeth_air * 2));

}

draw_piece(
  part_5_x, // part_x 
  part_5_y,  // part_y
  inner_width, // inner_dx
  inner_height, // inner_dy
  n_teeth // n_teeth
);


draw_piece(
  part_6_x, // part_x 
  part_6_y,  // part_y
  inner_width, // inner_dx
  inner_height, // inner_dy
  n_teeth // n_teeth
);
